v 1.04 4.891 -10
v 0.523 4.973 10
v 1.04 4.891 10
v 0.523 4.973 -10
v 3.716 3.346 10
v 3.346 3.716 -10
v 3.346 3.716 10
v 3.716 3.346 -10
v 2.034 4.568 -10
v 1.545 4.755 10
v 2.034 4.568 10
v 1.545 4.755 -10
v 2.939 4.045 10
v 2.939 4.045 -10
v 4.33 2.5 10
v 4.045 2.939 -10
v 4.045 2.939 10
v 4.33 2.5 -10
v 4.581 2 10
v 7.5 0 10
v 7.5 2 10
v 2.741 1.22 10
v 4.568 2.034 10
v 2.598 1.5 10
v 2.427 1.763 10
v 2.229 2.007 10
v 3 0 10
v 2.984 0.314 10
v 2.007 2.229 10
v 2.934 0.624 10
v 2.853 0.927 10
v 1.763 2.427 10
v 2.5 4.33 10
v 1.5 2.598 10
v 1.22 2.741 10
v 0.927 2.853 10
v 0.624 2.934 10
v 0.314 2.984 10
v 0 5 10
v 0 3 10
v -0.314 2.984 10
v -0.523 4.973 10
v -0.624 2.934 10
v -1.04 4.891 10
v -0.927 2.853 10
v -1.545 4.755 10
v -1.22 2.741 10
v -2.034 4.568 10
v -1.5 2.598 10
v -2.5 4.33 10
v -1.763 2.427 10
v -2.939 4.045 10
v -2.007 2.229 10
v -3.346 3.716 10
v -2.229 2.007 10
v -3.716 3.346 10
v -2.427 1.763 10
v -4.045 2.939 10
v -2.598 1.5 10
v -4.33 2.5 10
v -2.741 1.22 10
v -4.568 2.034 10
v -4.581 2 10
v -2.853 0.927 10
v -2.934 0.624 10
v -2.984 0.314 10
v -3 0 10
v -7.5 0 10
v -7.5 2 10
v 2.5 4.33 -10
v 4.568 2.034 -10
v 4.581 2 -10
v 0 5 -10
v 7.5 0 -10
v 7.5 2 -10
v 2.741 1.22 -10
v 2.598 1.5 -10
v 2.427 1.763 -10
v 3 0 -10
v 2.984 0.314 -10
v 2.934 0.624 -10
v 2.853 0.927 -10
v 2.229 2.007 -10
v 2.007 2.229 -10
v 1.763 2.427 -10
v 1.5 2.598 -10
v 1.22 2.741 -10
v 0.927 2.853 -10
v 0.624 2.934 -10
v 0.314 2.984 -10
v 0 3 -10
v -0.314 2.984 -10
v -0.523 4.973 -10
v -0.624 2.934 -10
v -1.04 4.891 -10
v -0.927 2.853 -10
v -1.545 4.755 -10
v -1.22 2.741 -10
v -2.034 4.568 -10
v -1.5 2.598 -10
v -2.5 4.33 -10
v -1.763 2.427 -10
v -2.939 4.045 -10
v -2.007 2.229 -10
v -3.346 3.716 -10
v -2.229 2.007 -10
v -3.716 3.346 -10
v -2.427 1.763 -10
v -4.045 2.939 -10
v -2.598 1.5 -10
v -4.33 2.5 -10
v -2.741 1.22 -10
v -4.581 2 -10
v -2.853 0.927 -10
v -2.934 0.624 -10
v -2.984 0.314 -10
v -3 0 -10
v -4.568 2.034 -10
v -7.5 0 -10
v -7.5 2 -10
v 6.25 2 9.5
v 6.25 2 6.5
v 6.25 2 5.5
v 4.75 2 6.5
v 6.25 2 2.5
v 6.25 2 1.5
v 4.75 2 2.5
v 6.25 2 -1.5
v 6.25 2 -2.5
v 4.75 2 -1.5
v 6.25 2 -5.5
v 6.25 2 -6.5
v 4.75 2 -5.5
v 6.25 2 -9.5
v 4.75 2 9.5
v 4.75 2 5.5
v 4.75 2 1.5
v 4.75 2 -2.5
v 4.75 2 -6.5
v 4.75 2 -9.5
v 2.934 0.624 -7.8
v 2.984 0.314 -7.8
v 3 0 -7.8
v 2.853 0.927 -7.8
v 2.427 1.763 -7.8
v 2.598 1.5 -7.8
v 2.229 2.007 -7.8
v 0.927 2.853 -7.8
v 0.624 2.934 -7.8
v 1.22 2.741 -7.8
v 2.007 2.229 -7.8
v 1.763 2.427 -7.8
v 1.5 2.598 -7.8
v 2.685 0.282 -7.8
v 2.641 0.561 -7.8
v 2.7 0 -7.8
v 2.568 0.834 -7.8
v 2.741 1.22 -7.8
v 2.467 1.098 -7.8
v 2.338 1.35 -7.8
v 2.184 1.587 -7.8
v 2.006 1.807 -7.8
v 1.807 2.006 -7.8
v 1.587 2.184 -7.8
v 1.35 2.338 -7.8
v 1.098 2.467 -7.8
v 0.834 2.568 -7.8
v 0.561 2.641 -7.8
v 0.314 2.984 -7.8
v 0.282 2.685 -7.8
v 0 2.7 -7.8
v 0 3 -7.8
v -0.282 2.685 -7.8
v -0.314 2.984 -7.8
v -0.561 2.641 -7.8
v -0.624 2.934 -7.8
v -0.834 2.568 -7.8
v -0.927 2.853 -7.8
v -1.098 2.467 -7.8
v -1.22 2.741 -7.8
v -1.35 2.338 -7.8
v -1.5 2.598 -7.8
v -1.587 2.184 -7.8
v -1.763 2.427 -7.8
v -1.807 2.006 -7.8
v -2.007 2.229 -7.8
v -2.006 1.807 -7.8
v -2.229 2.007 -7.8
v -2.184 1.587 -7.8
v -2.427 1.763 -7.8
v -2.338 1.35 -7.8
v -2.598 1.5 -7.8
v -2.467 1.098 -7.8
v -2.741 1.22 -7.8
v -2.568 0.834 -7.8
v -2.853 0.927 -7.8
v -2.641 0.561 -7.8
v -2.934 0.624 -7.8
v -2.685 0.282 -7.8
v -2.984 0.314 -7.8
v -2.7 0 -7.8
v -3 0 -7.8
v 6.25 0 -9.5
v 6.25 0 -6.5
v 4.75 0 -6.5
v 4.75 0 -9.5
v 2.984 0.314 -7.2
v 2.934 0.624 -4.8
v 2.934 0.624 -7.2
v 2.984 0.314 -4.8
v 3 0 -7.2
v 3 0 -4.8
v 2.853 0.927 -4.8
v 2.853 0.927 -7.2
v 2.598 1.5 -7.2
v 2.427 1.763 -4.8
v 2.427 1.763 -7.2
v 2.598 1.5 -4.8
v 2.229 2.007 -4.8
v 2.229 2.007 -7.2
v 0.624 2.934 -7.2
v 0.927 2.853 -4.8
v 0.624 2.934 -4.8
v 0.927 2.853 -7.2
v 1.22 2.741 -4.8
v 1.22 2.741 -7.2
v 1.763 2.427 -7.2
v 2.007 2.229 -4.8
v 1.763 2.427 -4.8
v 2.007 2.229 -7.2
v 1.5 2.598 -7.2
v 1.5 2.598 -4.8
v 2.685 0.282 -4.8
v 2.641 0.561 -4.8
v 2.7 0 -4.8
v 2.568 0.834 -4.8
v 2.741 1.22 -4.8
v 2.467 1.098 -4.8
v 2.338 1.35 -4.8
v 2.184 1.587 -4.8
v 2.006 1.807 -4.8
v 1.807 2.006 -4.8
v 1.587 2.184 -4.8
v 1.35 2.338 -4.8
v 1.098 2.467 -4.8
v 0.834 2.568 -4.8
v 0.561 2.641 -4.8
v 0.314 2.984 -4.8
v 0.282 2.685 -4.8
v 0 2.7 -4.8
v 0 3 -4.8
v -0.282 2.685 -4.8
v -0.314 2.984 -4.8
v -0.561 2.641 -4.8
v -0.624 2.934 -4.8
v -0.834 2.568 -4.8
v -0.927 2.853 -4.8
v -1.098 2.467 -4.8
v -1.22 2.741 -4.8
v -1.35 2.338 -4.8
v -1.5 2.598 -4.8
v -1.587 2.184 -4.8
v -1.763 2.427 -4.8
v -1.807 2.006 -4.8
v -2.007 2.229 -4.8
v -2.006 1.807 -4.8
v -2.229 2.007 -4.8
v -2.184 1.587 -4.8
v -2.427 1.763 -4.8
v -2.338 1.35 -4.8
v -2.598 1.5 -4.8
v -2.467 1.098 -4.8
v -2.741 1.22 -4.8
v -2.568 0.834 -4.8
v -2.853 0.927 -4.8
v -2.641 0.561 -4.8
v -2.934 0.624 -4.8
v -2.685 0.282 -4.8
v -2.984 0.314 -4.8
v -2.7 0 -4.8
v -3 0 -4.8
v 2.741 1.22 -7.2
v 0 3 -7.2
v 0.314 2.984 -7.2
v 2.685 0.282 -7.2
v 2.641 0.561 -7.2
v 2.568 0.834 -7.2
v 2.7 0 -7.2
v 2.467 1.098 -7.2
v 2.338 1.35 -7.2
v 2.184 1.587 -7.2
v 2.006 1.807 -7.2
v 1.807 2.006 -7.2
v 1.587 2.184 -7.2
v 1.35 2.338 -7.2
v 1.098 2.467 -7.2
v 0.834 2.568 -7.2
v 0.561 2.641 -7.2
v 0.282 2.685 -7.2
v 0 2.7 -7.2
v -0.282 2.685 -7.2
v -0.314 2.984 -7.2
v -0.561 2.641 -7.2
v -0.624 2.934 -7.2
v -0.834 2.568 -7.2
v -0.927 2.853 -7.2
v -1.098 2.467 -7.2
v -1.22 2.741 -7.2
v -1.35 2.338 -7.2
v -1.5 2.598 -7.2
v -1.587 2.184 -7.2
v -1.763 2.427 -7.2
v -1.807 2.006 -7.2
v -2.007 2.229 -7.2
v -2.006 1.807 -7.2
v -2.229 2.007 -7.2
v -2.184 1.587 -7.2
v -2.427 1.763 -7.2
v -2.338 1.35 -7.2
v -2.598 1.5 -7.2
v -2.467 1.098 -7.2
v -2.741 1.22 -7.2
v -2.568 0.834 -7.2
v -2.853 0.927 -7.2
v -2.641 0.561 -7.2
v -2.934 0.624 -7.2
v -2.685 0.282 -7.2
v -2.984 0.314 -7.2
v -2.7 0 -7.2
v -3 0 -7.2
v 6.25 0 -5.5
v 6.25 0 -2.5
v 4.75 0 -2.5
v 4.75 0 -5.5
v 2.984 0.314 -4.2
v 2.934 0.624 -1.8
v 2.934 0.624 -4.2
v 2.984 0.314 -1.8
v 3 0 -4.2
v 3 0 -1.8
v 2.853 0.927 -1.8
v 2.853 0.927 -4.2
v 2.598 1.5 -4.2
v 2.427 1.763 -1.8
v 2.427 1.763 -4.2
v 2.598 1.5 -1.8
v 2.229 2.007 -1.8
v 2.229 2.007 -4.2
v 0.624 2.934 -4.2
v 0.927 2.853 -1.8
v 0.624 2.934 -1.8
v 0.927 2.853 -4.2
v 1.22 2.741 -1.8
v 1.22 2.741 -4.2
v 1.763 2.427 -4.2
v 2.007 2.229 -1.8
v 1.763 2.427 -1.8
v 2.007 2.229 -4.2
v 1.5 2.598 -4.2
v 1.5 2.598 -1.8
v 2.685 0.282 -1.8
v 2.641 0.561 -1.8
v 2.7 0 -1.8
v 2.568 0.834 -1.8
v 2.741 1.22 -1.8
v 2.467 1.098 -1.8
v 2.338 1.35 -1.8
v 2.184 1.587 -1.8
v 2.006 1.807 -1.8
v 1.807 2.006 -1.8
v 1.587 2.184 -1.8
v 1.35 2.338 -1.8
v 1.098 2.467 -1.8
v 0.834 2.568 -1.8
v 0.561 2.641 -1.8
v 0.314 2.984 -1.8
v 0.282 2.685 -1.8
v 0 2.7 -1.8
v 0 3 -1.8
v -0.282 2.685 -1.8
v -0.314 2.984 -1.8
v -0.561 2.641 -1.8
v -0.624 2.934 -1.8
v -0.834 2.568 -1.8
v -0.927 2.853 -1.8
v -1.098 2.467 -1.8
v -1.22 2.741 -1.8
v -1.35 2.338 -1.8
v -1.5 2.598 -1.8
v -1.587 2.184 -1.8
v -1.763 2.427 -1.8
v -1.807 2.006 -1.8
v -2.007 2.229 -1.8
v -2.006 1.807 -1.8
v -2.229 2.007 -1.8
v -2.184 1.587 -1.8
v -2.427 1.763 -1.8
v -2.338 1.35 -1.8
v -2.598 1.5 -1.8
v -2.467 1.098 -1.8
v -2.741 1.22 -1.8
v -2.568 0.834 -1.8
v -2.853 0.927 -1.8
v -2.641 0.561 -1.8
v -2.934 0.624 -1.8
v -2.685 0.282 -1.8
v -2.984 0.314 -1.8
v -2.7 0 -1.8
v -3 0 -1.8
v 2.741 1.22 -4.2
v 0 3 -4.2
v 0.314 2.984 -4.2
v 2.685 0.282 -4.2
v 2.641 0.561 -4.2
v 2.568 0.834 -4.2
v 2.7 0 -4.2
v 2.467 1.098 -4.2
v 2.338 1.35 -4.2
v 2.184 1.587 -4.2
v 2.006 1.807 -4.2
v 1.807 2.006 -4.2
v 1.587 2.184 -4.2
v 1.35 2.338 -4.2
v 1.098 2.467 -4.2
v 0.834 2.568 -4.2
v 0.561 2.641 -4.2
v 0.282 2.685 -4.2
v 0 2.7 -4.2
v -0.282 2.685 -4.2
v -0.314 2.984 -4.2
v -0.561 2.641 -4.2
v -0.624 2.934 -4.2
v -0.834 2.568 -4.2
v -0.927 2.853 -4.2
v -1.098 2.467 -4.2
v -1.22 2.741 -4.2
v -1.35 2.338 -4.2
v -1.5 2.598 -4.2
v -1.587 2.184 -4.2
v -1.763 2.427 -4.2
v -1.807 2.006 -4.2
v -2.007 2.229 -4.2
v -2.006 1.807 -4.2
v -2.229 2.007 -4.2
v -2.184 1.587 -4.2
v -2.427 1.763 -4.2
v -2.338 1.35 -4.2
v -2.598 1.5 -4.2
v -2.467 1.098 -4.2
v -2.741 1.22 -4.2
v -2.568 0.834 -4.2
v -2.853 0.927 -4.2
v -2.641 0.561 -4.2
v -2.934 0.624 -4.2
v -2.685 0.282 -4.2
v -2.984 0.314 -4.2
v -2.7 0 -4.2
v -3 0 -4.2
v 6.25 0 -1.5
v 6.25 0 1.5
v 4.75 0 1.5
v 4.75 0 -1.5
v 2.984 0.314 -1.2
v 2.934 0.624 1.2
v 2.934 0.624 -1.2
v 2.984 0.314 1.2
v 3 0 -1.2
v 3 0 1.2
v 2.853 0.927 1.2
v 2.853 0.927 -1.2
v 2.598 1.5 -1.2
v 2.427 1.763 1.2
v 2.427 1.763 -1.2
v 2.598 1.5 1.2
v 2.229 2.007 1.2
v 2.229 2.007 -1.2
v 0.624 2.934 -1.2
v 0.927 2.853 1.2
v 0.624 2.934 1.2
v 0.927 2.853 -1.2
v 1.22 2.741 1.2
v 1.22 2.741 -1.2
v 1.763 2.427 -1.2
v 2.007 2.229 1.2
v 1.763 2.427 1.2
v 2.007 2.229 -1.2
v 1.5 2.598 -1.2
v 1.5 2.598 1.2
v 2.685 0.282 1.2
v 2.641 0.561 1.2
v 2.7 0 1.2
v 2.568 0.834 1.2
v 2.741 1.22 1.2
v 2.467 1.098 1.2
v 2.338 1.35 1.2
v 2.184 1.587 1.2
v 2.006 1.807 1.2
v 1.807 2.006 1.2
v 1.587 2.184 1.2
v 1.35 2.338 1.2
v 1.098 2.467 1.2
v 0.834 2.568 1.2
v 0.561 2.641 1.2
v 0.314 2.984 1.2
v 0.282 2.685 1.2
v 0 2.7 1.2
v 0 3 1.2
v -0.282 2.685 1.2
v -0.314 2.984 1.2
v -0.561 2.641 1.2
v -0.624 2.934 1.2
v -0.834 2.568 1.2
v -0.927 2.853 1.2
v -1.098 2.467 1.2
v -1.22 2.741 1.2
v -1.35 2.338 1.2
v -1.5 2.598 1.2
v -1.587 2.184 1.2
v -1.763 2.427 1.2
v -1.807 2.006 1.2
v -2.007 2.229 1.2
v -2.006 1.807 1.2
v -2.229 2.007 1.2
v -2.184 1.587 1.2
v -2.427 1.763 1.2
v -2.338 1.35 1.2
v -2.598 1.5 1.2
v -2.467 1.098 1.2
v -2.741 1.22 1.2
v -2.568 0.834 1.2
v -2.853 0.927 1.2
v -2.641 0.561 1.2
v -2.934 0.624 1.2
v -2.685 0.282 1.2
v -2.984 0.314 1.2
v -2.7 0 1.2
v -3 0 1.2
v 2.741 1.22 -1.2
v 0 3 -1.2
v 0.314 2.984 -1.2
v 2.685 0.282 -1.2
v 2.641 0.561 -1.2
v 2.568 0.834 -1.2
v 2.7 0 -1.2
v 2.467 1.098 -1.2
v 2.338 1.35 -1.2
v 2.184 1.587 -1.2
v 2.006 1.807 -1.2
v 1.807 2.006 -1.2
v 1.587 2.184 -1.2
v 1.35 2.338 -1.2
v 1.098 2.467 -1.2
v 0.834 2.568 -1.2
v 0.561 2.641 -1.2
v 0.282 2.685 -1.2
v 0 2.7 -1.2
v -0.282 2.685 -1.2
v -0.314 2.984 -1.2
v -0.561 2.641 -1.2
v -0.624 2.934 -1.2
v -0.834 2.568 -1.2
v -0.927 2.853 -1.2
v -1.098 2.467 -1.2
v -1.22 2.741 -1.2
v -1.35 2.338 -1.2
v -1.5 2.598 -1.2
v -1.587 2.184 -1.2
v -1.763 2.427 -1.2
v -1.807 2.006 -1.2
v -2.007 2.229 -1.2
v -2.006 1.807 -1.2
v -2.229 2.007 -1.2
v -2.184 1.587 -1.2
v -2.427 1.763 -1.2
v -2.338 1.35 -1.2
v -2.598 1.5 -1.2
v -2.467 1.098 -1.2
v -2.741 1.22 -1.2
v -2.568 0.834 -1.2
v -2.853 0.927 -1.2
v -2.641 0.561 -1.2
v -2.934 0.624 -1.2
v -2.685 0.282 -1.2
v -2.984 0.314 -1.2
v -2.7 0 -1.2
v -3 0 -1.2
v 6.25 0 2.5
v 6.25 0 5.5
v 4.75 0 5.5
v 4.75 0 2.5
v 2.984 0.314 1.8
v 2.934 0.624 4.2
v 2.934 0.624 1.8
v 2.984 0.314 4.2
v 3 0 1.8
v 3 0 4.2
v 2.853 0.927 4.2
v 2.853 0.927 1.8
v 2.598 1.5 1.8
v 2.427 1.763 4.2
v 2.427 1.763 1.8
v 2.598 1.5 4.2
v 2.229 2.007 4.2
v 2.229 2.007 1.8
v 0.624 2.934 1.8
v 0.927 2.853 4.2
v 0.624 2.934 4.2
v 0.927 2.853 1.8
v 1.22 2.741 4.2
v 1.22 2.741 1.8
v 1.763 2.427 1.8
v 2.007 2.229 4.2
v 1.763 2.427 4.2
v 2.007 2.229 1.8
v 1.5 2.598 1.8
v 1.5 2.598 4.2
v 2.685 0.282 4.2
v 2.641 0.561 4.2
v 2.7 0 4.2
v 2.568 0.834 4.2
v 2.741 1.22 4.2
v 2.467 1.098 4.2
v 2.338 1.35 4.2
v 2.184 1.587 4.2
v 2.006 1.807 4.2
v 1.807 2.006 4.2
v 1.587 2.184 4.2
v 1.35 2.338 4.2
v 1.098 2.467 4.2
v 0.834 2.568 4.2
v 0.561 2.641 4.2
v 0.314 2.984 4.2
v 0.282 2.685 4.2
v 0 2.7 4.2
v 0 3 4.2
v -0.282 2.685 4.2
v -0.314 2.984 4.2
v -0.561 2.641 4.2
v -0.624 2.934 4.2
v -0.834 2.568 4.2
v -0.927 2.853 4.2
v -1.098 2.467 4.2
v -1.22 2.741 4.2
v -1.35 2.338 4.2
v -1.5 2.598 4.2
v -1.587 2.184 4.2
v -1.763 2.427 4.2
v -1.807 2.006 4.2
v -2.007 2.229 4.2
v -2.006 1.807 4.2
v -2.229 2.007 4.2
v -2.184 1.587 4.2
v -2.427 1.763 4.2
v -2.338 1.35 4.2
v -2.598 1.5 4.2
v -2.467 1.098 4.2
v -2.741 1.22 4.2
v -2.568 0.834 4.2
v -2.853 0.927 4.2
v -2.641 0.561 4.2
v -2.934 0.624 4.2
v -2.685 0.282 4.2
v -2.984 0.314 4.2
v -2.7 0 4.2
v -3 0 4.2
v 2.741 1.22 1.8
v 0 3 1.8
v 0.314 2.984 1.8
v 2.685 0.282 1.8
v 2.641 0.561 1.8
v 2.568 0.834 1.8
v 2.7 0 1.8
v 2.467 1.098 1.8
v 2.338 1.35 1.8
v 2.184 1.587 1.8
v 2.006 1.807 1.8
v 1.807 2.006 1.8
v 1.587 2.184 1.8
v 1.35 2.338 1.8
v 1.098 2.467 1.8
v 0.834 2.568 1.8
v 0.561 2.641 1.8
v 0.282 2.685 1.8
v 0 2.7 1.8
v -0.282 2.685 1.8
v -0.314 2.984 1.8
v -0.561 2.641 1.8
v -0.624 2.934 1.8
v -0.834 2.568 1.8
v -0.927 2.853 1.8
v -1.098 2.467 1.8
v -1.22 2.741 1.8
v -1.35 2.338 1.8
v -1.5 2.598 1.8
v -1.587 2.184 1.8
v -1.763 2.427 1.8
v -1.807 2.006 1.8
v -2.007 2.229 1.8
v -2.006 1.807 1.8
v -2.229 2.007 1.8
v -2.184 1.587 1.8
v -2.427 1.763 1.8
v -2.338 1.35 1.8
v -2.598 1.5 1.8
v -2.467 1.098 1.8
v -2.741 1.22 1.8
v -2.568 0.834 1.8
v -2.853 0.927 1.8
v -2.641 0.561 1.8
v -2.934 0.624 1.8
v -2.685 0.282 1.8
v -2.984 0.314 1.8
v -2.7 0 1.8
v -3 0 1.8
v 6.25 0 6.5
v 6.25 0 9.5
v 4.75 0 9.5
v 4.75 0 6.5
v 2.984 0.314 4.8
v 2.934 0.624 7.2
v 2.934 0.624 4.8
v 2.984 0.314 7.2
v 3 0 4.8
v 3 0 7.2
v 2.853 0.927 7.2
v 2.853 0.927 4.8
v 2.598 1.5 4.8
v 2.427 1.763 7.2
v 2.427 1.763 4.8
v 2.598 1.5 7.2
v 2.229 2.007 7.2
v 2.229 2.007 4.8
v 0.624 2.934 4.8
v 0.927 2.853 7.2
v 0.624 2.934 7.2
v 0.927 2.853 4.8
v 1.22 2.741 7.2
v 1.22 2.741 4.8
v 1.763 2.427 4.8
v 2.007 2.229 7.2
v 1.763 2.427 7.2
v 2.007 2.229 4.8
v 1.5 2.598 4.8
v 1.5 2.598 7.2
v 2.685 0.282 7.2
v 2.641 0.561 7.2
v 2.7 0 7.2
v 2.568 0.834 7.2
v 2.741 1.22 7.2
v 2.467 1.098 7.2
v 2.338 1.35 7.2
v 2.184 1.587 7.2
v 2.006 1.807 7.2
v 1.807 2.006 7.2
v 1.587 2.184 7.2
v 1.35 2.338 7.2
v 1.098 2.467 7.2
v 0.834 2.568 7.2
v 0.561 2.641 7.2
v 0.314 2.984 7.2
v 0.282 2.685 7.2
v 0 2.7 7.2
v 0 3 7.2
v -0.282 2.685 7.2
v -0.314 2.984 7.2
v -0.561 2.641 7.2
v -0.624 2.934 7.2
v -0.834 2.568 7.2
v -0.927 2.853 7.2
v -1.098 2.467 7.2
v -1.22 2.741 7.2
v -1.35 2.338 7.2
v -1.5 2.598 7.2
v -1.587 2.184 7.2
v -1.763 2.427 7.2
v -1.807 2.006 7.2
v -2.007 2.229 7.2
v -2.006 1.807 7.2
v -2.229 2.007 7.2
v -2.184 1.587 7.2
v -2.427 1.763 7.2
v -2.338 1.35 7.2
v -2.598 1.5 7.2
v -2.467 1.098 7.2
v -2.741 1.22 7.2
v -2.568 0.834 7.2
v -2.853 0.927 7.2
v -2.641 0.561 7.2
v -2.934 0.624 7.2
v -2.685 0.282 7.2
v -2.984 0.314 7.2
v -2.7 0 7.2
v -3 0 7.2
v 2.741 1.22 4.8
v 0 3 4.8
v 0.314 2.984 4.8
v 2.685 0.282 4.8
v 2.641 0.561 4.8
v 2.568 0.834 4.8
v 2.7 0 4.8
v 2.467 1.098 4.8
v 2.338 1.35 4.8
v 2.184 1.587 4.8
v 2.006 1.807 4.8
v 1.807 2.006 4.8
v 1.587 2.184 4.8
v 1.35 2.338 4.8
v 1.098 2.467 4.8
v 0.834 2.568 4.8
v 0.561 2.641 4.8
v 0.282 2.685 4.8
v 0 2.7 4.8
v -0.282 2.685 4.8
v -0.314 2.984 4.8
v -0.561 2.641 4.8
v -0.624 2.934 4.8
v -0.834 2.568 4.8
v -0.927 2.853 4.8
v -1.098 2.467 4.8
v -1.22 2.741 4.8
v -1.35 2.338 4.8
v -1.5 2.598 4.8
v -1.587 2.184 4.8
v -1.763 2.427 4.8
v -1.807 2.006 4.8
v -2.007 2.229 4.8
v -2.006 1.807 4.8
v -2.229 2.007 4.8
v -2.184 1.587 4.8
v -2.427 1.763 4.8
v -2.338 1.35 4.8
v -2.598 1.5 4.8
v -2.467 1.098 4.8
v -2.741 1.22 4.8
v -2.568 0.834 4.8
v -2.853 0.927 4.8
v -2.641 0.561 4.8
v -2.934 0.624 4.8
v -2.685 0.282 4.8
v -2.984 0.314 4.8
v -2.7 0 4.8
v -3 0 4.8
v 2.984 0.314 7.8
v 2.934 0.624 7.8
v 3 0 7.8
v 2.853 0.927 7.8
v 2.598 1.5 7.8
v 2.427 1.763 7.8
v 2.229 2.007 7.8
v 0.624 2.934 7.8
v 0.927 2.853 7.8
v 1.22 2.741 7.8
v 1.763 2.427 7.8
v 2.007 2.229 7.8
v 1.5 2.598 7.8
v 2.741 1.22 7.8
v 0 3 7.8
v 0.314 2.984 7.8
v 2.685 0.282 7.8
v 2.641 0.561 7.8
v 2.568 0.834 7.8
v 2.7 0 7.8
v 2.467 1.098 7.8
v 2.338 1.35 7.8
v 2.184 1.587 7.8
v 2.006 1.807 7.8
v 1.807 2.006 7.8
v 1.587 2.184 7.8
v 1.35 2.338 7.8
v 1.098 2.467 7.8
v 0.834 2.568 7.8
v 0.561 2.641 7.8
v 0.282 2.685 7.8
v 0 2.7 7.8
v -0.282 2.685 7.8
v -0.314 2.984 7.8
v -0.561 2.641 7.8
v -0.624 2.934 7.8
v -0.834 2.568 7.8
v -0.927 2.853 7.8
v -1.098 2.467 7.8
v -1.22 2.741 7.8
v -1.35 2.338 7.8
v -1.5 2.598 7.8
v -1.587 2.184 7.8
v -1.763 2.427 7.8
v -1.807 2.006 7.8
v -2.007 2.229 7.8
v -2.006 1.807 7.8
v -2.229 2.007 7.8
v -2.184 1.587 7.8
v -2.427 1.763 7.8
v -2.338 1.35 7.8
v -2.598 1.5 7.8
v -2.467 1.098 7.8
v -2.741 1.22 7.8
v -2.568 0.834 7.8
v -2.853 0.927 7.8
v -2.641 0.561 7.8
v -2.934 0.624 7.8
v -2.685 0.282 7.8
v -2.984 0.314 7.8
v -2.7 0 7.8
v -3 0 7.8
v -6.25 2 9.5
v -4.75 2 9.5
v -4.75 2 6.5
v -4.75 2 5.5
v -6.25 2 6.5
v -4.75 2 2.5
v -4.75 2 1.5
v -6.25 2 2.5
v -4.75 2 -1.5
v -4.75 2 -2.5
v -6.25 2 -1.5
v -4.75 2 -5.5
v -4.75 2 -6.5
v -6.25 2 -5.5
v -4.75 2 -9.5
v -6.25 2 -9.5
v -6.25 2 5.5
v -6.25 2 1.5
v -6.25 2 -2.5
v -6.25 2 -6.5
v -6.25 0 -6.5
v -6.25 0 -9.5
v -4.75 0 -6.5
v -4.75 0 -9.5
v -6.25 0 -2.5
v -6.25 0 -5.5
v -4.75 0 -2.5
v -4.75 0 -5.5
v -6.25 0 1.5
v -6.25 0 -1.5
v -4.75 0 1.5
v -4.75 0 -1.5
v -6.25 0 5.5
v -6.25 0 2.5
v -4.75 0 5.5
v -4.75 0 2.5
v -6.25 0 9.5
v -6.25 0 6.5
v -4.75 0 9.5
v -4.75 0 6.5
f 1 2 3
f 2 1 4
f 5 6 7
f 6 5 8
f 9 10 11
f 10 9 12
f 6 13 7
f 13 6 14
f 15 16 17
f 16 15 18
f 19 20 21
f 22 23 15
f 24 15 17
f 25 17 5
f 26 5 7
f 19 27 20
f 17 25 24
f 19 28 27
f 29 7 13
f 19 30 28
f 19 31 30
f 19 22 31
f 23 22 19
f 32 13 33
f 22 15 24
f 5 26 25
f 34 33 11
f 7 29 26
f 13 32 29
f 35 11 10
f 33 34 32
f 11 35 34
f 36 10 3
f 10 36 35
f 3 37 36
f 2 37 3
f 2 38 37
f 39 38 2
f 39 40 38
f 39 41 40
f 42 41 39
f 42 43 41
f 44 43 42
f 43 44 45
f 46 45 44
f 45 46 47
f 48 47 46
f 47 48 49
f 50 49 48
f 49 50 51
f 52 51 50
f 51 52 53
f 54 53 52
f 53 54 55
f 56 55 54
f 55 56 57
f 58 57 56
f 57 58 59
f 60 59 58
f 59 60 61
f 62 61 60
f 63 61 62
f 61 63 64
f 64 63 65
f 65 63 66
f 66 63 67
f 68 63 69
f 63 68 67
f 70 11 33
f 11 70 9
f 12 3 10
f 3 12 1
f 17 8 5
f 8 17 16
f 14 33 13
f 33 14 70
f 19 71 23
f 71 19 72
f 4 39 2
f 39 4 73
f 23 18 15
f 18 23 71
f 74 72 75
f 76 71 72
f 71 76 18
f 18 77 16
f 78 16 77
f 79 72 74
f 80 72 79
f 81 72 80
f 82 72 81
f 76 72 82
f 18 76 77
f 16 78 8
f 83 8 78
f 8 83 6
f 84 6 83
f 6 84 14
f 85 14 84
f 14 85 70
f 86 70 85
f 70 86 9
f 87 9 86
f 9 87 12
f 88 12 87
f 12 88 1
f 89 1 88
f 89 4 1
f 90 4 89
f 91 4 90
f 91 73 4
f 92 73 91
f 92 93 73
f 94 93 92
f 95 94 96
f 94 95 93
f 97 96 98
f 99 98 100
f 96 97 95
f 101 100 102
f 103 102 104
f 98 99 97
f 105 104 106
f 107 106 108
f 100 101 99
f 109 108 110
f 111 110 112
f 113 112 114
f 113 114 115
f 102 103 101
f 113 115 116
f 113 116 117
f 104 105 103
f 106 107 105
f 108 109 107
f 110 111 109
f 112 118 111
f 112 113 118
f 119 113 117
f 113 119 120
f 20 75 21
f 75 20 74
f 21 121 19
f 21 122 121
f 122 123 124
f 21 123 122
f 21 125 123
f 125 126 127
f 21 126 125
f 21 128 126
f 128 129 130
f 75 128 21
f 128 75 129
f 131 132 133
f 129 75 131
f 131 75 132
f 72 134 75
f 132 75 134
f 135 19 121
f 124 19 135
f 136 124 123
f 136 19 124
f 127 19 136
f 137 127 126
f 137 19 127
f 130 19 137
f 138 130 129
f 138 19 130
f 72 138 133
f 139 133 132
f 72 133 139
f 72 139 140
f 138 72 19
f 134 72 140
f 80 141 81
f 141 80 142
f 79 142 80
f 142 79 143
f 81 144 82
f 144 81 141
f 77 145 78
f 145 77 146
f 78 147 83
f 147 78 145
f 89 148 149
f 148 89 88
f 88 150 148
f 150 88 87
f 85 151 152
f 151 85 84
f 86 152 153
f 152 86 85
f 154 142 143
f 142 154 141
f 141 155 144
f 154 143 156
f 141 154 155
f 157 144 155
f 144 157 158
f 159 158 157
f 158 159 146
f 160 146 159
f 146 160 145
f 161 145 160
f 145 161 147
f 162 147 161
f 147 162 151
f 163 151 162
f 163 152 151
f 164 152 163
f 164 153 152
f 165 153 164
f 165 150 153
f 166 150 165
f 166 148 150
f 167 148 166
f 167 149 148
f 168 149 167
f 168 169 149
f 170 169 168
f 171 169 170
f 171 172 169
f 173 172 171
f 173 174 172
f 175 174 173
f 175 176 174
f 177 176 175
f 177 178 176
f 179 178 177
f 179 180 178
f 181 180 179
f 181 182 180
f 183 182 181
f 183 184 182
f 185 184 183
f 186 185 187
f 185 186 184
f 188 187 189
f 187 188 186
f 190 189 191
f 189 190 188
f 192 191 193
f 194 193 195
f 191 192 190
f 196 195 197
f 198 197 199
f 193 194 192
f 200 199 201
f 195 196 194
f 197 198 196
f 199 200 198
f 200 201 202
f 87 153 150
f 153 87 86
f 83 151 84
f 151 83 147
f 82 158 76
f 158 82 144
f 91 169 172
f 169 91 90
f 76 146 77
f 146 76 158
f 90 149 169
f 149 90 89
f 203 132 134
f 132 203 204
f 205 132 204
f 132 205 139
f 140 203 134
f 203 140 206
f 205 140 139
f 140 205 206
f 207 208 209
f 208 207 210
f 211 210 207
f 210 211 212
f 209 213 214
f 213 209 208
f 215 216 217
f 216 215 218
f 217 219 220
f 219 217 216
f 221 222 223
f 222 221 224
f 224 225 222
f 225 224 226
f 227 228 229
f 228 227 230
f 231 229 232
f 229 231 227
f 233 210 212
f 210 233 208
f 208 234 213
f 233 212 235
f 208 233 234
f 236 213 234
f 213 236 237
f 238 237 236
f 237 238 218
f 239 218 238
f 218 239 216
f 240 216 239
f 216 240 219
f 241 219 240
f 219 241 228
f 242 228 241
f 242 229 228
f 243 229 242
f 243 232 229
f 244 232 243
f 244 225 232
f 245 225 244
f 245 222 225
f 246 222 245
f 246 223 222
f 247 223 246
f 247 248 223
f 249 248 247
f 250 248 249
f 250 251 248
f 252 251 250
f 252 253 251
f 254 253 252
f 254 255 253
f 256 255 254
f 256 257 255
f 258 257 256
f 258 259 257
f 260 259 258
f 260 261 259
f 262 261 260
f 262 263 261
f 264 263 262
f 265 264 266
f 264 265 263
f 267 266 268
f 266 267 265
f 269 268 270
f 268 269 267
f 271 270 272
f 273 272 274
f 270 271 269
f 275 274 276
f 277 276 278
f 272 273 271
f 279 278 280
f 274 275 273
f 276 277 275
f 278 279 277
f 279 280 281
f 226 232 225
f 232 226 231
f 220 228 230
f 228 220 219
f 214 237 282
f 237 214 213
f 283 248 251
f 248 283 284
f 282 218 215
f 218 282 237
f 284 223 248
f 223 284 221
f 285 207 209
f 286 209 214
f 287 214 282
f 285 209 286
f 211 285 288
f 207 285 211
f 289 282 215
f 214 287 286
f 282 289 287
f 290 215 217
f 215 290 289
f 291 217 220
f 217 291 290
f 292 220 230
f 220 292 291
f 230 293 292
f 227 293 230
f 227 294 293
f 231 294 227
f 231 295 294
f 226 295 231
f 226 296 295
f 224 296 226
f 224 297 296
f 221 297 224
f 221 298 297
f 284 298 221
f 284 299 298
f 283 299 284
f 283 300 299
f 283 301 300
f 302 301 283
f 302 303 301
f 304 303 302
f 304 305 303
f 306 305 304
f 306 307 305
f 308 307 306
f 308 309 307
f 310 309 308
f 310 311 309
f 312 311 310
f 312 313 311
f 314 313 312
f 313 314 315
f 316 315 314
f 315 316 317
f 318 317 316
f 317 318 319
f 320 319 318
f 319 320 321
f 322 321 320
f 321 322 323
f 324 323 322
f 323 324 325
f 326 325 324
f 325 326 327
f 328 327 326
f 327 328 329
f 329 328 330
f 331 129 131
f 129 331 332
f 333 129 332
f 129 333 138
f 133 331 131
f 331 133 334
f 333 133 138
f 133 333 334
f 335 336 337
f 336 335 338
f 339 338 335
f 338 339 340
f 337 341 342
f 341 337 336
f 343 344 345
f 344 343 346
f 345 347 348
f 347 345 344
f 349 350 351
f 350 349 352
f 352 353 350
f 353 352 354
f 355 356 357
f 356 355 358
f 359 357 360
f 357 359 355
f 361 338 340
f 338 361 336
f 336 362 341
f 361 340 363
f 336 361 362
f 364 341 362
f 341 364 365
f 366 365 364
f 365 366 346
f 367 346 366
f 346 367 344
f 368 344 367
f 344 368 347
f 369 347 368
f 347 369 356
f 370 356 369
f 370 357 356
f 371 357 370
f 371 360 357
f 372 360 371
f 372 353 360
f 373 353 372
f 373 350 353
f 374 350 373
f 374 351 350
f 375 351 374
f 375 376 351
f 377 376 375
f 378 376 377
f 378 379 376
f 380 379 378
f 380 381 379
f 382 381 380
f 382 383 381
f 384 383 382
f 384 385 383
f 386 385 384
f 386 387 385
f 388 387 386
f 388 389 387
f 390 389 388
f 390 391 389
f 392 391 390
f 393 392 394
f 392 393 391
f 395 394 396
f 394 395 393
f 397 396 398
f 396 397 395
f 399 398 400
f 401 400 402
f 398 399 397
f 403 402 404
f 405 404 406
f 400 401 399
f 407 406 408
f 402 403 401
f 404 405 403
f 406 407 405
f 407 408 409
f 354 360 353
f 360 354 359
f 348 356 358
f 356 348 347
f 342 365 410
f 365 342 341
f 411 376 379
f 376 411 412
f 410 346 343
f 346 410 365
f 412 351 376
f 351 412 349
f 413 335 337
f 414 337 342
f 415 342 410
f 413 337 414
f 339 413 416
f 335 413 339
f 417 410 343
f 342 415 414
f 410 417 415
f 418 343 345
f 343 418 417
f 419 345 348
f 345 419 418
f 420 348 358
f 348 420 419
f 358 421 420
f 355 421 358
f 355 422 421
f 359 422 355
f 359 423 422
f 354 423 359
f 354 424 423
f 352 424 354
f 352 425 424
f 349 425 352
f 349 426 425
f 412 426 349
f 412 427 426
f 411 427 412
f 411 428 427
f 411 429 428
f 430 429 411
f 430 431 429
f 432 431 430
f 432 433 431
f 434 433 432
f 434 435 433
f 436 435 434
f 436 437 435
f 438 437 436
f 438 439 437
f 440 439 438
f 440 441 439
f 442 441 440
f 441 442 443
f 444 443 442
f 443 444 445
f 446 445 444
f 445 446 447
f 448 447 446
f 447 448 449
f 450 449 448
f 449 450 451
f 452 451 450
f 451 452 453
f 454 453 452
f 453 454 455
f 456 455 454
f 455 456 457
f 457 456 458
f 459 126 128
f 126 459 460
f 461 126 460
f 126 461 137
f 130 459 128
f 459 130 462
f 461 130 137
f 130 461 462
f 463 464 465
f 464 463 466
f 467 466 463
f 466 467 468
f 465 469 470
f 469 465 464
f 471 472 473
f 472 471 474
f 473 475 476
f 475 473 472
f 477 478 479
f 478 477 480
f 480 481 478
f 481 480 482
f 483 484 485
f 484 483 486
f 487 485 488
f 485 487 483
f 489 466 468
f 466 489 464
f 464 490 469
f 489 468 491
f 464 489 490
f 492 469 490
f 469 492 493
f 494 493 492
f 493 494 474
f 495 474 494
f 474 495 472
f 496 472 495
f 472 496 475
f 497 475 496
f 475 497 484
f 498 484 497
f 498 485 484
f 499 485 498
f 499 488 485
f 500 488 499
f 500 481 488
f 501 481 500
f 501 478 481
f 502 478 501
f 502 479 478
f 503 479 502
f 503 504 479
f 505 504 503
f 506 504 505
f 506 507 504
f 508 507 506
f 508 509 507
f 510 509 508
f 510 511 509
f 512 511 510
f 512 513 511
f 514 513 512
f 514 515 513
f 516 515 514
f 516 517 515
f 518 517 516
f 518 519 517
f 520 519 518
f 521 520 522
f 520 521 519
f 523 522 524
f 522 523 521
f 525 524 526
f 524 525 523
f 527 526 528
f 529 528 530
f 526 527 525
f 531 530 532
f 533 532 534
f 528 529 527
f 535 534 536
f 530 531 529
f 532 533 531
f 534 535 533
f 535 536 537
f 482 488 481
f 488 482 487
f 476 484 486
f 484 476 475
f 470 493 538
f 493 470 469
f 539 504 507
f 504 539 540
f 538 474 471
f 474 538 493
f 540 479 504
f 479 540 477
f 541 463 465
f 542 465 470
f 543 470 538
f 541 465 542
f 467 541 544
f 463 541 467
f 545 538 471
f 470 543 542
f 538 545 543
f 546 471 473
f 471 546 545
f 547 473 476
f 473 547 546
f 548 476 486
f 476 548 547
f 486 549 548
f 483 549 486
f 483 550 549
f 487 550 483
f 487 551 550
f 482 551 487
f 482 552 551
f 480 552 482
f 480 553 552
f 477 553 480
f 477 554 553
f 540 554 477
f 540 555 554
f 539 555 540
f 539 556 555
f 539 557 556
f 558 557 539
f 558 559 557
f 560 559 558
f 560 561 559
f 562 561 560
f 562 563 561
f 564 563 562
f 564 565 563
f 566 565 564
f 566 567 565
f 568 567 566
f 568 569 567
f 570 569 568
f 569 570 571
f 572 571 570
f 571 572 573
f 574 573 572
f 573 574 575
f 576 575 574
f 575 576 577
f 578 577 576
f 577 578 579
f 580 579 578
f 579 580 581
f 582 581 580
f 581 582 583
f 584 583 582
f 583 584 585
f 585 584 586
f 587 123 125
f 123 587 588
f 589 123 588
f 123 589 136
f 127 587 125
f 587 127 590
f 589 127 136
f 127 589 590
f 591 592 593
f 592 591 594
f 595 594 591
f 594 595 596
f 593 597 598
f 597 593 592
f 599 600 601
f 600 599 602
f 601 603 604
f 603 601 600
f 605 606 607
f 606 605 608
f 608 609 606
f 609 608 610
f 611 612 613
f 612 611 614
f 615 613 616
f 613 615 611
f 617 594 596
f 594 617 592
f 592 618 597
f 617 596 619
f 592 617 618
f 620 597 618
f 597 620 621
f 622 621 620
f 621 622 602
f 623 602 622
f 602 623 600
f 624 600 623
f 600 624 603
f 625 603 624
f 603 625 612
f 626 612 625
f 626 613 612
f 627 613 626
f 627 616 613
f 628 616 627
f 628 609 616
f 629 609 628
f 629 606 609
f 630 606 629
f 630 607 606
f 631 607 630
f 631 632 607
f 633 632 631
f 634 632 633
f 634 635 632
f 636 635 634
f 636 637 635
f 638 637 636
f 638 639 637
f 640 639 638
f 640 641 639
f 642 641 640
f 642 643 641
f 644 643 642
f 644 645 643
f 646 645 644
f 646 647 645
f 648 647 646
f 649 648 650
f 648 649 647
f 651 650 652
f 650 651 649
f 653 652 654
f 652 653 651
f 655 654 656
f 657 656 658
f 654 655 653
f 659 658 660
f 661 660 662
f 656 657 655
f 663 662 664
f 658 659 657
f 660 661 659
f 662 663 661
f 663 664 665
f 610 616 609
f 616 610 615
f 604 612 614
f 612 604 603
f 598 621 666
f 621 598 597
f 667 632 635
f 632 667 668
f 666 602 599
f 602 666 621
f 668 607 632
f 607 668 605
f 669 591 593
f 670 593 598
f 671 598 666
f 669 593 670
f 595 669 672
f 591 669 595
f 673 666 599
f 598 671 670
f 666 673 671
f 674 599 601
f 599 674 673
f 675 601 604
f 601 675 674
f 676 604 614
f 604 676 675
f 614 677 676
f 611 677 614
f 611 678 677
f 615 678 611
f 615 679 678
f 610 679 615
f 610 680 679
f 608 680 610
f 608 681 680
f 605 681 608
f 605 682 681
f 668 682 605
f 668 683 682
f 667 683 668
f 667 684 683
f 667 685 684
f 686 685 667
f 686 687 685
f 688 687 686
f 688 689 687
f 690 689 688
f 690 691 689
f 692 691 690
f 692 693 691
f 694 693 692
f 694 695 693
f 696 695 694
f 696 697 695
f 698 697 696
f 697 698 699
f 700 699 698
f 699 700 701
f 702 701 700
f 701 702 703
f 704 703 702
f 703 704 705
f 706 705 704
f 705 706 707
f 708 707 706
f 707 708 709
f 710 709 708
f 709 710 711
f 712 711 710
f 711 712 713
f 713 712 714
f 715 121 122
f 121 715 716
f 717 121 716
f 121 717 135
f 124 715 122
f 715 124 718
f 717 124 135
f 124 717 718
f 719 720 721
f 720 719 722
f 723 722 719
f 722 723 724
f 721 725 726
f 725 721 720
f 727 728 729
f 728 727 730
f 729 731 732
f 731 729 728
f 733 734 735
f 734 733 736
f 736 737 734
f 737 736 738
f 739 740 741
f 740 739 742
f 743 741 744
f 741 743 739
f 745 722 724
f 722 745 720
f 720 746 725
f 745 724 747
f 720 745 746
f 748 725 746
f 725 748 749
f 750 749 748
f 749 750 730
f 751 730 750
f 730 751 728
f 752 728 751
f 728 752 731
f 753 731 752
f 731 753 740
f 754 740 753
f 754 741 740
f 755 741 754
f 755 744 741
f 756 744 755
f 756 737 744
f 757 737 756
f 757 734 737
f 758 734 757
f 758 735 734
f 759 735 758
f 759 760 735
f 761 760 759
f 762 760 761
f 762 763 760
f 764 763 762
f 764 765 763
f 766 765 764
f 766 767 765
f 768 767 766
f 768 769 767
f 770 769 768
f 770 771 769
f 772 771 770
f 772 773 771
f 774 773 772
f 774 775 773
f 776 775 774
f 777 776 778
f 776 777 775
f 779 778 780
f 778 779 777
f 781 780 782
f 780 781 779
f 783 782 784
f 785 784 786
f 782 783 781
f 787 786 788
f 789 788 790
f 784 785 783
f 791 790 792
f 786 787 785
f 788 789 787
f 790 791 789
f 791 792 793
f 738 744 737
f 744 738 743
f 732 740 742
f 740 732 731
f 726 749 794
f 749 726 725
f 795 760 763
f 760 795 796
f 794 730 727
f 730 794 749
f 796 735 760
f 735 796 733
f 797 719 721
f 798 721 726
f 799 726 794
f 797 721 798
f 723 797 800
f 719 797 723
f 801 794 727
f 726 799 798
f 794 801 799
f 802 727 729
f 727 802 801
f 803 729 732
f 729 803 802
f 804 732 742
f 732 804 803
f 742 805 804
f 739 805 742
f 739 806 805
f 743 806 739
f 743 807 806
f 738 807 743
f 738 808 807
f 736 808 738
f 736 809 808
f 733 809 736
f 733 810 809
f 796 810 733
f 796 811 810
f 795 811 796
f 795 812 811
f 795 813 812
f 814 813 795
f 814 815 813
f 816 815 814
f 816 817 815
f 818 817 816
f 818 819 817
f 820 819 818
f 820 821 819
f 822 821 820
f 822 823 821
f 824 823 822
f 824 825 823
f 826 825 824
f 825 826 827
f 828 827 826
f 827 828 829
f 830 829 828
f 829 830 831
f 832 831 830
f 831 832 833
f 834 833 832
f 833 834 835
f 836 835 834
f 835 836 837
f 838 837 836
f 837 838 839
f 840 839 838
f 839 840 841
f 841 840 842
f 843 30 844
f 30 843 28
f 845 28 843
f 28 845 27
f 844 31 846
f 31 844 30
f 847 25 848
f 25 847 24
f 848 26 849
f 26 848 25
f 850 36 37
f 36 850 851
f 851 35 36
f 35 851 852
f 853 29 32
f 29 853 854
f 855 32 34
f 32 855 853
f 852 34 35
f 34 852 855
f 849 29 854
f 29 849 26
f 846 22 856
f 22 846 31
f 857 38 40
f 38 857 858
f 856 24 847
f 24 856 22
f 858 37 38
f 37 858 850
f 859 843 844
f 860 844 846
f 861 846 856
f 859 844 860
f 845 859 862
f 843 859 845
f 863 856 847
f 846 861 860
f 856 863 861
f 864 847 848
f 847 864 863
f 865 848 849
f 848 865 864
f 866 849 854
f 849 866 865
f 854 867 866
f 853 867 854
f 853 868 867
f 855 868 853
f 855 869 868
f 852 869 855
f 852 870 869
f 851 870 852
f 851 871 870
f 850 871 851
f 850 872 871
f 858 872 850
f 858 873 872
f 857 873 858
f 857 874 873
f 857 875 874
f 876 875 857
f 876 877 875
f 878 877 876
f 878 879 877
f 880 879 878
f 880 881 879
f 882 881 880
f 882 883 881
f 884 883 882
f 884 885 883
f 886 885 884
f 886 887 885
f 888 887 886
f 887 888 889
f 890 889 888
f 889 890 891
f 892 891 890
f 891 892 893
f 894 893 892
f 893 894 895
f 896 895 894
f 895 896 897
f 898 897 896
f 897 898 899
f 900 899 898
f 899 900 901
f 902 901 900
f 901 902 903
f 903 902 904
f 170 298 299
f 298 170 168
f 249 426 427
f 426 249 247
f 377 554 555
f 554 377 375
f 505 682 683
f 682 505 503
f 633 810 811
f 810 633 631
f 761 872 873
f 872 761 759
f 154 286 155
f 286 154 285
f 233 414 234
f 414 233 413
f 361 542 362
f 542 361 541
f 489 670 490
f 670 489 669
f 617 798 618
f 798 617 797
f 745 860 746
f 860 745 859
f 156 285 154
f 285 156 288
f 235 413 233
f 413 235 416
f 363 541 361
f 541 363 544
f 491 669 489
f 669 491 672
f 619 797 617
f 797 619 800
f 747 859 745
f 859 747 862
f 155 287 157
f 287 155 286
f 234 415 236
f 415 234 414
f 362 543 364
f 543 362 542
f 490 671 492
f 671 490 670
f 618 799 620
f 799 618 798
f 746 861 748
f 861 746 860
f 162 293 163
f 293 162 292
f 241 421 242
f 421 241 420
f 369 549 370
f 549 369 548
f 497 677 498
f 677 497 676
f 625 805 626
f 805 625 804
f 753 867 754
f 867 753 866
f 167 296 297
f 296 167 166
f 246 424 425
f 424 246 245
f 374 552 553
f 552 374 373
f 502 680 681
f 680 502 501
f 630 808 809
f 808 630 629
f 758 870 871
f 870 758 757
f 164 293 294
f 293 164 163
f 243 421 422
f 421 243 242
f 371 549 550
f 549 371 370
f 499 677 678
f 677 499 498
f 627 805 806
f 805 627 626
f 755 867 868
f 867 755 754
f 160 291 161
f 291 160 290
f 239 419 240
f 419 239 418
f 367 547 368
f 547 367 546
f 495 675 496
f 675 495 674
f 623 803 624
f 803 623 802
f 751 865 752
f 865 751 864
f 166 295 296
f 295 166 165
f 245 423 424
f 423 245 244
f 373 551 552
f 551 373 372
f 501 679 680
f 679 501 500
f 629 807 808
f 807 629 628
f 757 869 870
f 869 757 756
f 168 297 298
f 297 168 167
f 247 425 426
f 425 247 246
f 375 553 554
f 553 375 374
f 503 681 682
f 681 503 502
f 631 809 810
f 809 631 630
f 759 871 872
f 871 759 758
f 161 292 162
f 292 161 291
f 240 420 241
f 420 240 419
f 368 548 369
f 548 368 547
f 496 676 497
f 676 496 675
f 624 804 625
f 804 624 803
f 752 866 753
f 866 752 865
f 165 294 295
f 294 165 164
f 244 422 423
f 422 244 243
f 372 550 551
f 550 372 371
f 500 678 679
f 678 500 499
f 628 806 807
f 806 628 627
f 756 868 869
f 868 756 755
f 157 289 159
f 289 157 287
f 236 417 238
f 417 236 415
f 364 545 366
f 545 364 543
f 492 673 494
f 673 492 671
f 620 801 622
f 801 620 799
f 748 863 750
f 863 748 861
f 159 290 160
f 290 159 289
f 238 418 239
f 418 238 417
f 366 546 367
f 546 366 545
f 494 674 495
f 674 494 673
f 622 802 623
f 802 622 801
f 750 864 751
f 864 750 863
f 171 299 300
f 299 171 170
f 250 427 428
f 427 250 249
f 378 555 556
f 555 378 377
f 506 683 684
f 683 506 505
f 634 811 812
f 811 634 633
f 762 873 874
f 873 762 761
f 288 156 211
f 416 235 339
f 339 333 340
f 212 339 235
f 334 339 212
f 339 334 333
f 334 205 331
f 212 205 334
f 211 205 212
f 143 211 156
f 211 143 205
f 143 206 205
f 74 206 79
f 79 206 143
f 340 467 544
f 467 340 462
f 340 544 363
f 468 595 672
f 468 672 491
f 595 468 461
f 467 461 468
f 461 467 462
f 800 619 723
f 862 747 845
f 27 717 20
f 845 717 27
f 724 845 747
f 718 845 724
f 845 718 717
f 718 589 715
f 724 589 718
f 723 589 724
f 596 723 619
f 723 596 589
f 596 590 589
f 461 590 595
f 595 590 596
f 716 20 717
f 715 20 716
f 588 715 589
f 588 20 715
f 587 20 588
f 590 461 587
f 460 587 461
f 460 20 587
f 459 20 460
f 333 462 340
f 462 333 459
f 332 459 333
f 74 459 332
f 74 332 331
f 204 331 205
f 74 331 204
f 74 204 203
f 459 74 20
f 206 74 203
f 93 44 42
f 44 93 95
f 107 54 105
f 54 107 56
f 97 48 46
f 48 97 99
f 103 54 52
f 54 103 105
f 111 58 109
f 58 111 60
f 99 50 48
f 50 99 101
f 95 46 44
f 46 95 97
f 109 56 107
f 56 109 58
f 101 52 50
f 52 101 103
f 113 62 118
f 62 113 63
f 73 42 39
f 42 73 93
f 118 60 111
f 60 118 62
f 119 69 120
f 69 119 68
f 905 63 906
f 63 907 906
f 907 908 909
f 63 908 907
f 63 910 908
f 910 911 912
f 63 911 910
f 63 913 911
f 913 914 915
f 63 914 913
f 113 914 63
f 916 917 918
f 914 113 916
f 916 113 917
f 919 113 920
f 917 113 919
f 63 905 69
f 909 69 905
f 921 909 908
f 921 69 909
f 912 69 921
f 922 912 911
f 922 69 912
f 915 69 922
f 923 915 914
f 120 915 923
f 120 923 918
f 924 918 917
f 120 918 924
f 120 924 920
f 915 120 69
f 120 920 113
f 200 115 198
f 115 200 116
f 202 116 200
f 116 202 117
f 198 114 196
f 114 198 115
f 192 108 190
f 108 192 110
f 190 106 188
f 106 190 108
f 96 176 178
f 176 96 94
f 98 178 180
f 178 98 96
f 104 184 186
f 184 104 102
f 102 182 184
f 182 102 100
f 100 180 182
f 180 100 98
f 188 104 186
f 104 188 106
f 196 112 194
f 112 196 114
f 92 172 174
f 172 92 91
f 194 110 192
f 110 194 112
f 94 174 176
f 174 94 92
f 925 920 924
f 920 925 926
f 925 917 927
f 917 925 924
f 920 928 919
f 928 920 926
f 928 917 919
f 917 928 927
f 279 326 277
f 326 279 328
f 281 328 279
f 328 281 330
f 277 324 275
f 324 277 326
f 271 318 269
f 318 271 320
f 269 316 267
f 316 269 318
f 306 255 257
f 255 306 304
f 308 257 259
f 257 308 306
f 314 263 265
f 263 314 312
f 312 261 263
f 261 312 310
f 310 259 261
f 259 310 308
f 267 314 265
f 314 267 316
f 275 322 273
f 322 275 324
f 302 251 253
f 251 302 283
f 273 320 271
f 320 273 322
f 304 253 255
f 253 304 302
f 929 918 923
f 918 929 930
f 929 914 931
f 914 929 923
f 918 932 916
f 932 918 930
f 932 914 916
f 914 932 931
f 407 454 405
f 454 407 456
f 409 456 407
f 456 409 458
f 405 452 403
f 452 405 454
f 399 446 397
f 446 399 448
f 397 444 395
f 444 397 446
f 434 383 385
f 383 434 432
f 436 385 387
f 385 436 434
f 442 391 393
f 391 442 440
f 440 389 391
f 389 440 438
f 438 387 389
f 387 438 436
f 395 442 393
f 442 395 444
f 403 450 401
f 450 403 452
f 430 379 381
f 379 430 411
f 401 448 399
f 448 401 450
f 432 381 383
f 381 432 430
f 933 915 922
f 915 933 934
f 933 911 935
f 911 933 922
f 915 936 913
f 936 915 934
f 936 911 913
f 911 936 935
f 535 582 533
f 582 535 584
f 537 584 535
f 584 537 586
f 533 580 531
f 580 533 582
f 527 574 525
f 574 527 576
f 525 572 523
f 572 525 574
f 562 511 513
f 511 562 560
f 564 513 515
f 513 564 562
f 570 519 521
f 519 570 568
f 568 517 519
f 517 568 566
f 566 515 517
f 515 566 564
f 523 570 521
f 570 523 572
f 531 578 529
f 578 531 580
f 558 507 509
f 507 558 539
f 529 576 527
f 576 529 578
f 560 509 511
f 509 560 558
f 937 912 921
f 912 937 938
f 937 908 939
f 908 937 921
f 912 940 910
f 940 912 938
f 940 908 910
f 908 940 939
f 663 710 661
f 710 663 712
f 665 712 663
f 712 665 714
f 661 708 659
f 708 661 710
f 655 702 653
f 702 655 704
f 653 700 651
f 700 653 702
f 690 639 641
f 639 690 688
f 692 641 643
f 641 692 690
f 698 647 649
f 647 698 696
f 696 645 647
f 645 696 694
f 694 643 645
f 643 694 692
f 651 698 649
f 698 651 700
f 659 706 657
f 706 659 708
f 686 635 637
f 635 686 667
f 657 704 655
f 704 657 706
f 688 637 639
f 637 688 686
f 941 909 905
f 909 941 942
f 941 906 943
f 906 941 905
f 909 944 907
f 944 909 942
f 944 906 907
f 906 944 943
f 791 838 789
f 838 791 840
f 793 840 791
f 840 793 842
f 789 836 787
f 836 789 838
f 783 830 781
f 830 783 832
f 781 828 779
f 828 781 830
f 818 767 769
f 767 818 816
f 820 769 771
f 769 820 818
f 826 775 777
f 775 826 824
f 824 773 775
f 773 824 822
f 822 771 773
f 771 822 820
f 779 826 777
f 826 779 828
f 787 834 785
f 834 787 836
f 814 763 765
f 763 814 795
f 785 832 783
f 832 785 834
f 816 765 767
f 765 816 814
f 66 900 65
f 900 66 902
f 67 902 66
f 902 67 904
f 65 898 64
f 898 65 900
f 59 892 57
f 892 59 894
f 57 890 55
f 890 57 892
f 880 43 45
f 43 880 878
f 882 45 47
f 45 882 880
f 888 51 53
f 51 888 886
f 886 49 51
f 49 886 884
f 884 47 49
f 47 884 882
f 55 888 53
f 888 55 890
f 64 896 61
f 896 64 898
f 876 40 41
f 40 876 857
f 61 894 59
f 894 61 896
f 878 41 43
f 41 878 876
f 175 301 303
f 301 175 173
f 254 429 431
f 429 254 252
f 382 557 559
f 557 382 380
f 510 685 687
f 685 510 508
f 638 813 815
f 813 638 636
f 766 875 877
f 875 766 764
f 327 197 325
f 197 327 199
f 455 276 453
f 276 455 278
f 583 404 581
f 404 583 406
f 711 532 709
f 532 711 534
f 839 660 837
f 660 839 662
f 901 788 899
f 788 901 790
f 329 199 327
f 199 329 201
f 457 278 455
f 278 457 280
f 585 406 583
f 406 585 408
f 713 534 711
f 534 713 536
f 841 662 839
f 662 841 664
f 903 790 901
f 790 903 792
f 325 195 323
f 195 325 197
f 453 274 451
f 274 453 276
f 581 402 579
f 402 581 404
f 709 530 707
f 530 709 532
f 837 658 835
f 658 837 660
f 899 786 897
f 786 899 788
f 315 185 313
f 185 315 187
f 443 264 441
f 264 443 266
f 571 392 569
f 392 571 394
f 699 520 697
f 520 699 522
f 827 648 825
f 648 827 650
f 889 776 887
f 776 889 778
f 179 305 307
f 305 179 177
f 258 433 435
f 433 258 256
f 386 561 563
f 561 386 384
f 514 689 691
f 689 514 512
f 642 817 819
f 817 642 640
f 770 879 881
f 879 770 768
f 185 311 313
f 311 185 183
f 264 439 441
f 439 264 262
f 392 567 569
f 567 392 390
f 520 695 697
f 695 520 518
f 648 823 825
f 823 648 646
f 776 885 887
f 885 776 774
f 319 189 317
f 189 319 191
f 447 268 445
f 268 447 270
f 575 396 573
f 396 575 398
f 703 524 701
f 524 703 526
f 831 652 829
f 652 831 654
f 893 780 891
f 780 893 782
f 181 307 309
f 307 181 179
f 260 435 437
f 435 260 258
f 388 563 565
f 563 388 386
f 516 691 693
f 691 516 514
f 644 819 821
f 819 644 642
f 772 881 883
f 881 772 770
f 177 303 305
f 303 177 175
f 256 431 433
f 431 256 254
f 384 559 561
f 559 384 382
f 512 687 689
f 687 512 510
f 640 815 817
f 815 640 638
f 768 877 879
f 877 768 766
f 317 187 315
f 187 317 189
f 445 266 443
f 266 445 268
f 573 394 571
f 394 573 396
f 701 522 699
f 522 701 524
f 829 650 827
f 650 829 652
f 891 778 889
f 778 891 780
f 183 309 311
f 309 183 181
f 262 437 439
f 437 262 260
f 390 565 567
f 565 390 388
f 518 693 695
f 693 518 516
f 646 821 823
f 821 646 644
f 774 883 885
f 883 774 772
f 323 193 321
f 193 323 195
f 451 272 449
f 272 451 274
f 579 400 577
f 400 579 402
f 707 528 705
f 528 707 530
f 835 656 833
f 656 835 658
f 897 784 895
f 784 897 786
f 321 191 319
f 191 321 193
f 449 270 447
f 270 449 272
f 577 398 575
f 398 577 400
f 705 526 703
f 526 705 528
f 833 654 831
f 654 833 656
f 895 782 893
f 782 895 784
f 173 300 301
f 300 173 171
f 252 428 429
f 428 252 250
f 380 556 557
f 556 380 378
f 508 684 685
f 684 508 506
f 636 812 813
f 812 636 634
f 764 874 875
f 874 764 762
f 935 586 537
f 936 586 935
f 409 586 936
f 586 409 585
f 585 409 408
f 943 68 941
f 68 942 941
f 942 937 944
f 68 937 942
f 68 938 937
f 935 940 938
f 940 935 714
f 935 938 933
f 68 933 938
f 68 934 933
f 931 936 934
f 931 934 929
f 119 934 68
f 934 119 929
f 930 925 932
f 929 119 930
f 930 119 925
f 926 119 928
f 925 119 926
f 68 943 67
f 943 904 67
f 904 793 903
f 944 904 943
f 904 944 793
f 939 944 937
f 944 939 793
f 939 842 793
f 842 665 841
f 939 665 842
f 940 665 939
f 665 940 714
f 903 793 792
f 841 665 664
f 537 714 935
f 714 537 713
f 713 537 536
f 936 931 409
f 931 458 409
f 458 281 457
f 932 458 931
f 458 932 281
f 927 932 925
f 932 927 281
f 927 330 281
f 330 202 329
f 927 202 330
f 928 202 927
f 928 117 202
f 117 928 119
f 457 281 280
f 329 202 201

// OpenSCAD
d=6;
h=20;
hole_height=3;

$fn=60;

hole_count = round(h/(hole_height+1));

module x_mirror() {
  children();
  mirror([1,0,0]) children();
}

x_mirror() {
intersection() {
  translate([0,0,-h/2]) cube([d+8, d+2, h]);

  difference() {
    union() {
      cylinder(d=d+4, h=h, center=true);
      cube([d+9, 4, h], center=true);
    }
    union() {
      cylinder(d=d-0.6, h=h+0.01, center=true);
      for (i=[-hole_count:hole_count]) {
        translate([d/2+2.5, 0, (hole_height+1)*i]) cube([1.5,5,hole_height], center=true);
        translate([0,0,i*hole_height]) cylinder(d=d, h=hole_height-0.6, center=true);
      }
    }
  }
}
}
